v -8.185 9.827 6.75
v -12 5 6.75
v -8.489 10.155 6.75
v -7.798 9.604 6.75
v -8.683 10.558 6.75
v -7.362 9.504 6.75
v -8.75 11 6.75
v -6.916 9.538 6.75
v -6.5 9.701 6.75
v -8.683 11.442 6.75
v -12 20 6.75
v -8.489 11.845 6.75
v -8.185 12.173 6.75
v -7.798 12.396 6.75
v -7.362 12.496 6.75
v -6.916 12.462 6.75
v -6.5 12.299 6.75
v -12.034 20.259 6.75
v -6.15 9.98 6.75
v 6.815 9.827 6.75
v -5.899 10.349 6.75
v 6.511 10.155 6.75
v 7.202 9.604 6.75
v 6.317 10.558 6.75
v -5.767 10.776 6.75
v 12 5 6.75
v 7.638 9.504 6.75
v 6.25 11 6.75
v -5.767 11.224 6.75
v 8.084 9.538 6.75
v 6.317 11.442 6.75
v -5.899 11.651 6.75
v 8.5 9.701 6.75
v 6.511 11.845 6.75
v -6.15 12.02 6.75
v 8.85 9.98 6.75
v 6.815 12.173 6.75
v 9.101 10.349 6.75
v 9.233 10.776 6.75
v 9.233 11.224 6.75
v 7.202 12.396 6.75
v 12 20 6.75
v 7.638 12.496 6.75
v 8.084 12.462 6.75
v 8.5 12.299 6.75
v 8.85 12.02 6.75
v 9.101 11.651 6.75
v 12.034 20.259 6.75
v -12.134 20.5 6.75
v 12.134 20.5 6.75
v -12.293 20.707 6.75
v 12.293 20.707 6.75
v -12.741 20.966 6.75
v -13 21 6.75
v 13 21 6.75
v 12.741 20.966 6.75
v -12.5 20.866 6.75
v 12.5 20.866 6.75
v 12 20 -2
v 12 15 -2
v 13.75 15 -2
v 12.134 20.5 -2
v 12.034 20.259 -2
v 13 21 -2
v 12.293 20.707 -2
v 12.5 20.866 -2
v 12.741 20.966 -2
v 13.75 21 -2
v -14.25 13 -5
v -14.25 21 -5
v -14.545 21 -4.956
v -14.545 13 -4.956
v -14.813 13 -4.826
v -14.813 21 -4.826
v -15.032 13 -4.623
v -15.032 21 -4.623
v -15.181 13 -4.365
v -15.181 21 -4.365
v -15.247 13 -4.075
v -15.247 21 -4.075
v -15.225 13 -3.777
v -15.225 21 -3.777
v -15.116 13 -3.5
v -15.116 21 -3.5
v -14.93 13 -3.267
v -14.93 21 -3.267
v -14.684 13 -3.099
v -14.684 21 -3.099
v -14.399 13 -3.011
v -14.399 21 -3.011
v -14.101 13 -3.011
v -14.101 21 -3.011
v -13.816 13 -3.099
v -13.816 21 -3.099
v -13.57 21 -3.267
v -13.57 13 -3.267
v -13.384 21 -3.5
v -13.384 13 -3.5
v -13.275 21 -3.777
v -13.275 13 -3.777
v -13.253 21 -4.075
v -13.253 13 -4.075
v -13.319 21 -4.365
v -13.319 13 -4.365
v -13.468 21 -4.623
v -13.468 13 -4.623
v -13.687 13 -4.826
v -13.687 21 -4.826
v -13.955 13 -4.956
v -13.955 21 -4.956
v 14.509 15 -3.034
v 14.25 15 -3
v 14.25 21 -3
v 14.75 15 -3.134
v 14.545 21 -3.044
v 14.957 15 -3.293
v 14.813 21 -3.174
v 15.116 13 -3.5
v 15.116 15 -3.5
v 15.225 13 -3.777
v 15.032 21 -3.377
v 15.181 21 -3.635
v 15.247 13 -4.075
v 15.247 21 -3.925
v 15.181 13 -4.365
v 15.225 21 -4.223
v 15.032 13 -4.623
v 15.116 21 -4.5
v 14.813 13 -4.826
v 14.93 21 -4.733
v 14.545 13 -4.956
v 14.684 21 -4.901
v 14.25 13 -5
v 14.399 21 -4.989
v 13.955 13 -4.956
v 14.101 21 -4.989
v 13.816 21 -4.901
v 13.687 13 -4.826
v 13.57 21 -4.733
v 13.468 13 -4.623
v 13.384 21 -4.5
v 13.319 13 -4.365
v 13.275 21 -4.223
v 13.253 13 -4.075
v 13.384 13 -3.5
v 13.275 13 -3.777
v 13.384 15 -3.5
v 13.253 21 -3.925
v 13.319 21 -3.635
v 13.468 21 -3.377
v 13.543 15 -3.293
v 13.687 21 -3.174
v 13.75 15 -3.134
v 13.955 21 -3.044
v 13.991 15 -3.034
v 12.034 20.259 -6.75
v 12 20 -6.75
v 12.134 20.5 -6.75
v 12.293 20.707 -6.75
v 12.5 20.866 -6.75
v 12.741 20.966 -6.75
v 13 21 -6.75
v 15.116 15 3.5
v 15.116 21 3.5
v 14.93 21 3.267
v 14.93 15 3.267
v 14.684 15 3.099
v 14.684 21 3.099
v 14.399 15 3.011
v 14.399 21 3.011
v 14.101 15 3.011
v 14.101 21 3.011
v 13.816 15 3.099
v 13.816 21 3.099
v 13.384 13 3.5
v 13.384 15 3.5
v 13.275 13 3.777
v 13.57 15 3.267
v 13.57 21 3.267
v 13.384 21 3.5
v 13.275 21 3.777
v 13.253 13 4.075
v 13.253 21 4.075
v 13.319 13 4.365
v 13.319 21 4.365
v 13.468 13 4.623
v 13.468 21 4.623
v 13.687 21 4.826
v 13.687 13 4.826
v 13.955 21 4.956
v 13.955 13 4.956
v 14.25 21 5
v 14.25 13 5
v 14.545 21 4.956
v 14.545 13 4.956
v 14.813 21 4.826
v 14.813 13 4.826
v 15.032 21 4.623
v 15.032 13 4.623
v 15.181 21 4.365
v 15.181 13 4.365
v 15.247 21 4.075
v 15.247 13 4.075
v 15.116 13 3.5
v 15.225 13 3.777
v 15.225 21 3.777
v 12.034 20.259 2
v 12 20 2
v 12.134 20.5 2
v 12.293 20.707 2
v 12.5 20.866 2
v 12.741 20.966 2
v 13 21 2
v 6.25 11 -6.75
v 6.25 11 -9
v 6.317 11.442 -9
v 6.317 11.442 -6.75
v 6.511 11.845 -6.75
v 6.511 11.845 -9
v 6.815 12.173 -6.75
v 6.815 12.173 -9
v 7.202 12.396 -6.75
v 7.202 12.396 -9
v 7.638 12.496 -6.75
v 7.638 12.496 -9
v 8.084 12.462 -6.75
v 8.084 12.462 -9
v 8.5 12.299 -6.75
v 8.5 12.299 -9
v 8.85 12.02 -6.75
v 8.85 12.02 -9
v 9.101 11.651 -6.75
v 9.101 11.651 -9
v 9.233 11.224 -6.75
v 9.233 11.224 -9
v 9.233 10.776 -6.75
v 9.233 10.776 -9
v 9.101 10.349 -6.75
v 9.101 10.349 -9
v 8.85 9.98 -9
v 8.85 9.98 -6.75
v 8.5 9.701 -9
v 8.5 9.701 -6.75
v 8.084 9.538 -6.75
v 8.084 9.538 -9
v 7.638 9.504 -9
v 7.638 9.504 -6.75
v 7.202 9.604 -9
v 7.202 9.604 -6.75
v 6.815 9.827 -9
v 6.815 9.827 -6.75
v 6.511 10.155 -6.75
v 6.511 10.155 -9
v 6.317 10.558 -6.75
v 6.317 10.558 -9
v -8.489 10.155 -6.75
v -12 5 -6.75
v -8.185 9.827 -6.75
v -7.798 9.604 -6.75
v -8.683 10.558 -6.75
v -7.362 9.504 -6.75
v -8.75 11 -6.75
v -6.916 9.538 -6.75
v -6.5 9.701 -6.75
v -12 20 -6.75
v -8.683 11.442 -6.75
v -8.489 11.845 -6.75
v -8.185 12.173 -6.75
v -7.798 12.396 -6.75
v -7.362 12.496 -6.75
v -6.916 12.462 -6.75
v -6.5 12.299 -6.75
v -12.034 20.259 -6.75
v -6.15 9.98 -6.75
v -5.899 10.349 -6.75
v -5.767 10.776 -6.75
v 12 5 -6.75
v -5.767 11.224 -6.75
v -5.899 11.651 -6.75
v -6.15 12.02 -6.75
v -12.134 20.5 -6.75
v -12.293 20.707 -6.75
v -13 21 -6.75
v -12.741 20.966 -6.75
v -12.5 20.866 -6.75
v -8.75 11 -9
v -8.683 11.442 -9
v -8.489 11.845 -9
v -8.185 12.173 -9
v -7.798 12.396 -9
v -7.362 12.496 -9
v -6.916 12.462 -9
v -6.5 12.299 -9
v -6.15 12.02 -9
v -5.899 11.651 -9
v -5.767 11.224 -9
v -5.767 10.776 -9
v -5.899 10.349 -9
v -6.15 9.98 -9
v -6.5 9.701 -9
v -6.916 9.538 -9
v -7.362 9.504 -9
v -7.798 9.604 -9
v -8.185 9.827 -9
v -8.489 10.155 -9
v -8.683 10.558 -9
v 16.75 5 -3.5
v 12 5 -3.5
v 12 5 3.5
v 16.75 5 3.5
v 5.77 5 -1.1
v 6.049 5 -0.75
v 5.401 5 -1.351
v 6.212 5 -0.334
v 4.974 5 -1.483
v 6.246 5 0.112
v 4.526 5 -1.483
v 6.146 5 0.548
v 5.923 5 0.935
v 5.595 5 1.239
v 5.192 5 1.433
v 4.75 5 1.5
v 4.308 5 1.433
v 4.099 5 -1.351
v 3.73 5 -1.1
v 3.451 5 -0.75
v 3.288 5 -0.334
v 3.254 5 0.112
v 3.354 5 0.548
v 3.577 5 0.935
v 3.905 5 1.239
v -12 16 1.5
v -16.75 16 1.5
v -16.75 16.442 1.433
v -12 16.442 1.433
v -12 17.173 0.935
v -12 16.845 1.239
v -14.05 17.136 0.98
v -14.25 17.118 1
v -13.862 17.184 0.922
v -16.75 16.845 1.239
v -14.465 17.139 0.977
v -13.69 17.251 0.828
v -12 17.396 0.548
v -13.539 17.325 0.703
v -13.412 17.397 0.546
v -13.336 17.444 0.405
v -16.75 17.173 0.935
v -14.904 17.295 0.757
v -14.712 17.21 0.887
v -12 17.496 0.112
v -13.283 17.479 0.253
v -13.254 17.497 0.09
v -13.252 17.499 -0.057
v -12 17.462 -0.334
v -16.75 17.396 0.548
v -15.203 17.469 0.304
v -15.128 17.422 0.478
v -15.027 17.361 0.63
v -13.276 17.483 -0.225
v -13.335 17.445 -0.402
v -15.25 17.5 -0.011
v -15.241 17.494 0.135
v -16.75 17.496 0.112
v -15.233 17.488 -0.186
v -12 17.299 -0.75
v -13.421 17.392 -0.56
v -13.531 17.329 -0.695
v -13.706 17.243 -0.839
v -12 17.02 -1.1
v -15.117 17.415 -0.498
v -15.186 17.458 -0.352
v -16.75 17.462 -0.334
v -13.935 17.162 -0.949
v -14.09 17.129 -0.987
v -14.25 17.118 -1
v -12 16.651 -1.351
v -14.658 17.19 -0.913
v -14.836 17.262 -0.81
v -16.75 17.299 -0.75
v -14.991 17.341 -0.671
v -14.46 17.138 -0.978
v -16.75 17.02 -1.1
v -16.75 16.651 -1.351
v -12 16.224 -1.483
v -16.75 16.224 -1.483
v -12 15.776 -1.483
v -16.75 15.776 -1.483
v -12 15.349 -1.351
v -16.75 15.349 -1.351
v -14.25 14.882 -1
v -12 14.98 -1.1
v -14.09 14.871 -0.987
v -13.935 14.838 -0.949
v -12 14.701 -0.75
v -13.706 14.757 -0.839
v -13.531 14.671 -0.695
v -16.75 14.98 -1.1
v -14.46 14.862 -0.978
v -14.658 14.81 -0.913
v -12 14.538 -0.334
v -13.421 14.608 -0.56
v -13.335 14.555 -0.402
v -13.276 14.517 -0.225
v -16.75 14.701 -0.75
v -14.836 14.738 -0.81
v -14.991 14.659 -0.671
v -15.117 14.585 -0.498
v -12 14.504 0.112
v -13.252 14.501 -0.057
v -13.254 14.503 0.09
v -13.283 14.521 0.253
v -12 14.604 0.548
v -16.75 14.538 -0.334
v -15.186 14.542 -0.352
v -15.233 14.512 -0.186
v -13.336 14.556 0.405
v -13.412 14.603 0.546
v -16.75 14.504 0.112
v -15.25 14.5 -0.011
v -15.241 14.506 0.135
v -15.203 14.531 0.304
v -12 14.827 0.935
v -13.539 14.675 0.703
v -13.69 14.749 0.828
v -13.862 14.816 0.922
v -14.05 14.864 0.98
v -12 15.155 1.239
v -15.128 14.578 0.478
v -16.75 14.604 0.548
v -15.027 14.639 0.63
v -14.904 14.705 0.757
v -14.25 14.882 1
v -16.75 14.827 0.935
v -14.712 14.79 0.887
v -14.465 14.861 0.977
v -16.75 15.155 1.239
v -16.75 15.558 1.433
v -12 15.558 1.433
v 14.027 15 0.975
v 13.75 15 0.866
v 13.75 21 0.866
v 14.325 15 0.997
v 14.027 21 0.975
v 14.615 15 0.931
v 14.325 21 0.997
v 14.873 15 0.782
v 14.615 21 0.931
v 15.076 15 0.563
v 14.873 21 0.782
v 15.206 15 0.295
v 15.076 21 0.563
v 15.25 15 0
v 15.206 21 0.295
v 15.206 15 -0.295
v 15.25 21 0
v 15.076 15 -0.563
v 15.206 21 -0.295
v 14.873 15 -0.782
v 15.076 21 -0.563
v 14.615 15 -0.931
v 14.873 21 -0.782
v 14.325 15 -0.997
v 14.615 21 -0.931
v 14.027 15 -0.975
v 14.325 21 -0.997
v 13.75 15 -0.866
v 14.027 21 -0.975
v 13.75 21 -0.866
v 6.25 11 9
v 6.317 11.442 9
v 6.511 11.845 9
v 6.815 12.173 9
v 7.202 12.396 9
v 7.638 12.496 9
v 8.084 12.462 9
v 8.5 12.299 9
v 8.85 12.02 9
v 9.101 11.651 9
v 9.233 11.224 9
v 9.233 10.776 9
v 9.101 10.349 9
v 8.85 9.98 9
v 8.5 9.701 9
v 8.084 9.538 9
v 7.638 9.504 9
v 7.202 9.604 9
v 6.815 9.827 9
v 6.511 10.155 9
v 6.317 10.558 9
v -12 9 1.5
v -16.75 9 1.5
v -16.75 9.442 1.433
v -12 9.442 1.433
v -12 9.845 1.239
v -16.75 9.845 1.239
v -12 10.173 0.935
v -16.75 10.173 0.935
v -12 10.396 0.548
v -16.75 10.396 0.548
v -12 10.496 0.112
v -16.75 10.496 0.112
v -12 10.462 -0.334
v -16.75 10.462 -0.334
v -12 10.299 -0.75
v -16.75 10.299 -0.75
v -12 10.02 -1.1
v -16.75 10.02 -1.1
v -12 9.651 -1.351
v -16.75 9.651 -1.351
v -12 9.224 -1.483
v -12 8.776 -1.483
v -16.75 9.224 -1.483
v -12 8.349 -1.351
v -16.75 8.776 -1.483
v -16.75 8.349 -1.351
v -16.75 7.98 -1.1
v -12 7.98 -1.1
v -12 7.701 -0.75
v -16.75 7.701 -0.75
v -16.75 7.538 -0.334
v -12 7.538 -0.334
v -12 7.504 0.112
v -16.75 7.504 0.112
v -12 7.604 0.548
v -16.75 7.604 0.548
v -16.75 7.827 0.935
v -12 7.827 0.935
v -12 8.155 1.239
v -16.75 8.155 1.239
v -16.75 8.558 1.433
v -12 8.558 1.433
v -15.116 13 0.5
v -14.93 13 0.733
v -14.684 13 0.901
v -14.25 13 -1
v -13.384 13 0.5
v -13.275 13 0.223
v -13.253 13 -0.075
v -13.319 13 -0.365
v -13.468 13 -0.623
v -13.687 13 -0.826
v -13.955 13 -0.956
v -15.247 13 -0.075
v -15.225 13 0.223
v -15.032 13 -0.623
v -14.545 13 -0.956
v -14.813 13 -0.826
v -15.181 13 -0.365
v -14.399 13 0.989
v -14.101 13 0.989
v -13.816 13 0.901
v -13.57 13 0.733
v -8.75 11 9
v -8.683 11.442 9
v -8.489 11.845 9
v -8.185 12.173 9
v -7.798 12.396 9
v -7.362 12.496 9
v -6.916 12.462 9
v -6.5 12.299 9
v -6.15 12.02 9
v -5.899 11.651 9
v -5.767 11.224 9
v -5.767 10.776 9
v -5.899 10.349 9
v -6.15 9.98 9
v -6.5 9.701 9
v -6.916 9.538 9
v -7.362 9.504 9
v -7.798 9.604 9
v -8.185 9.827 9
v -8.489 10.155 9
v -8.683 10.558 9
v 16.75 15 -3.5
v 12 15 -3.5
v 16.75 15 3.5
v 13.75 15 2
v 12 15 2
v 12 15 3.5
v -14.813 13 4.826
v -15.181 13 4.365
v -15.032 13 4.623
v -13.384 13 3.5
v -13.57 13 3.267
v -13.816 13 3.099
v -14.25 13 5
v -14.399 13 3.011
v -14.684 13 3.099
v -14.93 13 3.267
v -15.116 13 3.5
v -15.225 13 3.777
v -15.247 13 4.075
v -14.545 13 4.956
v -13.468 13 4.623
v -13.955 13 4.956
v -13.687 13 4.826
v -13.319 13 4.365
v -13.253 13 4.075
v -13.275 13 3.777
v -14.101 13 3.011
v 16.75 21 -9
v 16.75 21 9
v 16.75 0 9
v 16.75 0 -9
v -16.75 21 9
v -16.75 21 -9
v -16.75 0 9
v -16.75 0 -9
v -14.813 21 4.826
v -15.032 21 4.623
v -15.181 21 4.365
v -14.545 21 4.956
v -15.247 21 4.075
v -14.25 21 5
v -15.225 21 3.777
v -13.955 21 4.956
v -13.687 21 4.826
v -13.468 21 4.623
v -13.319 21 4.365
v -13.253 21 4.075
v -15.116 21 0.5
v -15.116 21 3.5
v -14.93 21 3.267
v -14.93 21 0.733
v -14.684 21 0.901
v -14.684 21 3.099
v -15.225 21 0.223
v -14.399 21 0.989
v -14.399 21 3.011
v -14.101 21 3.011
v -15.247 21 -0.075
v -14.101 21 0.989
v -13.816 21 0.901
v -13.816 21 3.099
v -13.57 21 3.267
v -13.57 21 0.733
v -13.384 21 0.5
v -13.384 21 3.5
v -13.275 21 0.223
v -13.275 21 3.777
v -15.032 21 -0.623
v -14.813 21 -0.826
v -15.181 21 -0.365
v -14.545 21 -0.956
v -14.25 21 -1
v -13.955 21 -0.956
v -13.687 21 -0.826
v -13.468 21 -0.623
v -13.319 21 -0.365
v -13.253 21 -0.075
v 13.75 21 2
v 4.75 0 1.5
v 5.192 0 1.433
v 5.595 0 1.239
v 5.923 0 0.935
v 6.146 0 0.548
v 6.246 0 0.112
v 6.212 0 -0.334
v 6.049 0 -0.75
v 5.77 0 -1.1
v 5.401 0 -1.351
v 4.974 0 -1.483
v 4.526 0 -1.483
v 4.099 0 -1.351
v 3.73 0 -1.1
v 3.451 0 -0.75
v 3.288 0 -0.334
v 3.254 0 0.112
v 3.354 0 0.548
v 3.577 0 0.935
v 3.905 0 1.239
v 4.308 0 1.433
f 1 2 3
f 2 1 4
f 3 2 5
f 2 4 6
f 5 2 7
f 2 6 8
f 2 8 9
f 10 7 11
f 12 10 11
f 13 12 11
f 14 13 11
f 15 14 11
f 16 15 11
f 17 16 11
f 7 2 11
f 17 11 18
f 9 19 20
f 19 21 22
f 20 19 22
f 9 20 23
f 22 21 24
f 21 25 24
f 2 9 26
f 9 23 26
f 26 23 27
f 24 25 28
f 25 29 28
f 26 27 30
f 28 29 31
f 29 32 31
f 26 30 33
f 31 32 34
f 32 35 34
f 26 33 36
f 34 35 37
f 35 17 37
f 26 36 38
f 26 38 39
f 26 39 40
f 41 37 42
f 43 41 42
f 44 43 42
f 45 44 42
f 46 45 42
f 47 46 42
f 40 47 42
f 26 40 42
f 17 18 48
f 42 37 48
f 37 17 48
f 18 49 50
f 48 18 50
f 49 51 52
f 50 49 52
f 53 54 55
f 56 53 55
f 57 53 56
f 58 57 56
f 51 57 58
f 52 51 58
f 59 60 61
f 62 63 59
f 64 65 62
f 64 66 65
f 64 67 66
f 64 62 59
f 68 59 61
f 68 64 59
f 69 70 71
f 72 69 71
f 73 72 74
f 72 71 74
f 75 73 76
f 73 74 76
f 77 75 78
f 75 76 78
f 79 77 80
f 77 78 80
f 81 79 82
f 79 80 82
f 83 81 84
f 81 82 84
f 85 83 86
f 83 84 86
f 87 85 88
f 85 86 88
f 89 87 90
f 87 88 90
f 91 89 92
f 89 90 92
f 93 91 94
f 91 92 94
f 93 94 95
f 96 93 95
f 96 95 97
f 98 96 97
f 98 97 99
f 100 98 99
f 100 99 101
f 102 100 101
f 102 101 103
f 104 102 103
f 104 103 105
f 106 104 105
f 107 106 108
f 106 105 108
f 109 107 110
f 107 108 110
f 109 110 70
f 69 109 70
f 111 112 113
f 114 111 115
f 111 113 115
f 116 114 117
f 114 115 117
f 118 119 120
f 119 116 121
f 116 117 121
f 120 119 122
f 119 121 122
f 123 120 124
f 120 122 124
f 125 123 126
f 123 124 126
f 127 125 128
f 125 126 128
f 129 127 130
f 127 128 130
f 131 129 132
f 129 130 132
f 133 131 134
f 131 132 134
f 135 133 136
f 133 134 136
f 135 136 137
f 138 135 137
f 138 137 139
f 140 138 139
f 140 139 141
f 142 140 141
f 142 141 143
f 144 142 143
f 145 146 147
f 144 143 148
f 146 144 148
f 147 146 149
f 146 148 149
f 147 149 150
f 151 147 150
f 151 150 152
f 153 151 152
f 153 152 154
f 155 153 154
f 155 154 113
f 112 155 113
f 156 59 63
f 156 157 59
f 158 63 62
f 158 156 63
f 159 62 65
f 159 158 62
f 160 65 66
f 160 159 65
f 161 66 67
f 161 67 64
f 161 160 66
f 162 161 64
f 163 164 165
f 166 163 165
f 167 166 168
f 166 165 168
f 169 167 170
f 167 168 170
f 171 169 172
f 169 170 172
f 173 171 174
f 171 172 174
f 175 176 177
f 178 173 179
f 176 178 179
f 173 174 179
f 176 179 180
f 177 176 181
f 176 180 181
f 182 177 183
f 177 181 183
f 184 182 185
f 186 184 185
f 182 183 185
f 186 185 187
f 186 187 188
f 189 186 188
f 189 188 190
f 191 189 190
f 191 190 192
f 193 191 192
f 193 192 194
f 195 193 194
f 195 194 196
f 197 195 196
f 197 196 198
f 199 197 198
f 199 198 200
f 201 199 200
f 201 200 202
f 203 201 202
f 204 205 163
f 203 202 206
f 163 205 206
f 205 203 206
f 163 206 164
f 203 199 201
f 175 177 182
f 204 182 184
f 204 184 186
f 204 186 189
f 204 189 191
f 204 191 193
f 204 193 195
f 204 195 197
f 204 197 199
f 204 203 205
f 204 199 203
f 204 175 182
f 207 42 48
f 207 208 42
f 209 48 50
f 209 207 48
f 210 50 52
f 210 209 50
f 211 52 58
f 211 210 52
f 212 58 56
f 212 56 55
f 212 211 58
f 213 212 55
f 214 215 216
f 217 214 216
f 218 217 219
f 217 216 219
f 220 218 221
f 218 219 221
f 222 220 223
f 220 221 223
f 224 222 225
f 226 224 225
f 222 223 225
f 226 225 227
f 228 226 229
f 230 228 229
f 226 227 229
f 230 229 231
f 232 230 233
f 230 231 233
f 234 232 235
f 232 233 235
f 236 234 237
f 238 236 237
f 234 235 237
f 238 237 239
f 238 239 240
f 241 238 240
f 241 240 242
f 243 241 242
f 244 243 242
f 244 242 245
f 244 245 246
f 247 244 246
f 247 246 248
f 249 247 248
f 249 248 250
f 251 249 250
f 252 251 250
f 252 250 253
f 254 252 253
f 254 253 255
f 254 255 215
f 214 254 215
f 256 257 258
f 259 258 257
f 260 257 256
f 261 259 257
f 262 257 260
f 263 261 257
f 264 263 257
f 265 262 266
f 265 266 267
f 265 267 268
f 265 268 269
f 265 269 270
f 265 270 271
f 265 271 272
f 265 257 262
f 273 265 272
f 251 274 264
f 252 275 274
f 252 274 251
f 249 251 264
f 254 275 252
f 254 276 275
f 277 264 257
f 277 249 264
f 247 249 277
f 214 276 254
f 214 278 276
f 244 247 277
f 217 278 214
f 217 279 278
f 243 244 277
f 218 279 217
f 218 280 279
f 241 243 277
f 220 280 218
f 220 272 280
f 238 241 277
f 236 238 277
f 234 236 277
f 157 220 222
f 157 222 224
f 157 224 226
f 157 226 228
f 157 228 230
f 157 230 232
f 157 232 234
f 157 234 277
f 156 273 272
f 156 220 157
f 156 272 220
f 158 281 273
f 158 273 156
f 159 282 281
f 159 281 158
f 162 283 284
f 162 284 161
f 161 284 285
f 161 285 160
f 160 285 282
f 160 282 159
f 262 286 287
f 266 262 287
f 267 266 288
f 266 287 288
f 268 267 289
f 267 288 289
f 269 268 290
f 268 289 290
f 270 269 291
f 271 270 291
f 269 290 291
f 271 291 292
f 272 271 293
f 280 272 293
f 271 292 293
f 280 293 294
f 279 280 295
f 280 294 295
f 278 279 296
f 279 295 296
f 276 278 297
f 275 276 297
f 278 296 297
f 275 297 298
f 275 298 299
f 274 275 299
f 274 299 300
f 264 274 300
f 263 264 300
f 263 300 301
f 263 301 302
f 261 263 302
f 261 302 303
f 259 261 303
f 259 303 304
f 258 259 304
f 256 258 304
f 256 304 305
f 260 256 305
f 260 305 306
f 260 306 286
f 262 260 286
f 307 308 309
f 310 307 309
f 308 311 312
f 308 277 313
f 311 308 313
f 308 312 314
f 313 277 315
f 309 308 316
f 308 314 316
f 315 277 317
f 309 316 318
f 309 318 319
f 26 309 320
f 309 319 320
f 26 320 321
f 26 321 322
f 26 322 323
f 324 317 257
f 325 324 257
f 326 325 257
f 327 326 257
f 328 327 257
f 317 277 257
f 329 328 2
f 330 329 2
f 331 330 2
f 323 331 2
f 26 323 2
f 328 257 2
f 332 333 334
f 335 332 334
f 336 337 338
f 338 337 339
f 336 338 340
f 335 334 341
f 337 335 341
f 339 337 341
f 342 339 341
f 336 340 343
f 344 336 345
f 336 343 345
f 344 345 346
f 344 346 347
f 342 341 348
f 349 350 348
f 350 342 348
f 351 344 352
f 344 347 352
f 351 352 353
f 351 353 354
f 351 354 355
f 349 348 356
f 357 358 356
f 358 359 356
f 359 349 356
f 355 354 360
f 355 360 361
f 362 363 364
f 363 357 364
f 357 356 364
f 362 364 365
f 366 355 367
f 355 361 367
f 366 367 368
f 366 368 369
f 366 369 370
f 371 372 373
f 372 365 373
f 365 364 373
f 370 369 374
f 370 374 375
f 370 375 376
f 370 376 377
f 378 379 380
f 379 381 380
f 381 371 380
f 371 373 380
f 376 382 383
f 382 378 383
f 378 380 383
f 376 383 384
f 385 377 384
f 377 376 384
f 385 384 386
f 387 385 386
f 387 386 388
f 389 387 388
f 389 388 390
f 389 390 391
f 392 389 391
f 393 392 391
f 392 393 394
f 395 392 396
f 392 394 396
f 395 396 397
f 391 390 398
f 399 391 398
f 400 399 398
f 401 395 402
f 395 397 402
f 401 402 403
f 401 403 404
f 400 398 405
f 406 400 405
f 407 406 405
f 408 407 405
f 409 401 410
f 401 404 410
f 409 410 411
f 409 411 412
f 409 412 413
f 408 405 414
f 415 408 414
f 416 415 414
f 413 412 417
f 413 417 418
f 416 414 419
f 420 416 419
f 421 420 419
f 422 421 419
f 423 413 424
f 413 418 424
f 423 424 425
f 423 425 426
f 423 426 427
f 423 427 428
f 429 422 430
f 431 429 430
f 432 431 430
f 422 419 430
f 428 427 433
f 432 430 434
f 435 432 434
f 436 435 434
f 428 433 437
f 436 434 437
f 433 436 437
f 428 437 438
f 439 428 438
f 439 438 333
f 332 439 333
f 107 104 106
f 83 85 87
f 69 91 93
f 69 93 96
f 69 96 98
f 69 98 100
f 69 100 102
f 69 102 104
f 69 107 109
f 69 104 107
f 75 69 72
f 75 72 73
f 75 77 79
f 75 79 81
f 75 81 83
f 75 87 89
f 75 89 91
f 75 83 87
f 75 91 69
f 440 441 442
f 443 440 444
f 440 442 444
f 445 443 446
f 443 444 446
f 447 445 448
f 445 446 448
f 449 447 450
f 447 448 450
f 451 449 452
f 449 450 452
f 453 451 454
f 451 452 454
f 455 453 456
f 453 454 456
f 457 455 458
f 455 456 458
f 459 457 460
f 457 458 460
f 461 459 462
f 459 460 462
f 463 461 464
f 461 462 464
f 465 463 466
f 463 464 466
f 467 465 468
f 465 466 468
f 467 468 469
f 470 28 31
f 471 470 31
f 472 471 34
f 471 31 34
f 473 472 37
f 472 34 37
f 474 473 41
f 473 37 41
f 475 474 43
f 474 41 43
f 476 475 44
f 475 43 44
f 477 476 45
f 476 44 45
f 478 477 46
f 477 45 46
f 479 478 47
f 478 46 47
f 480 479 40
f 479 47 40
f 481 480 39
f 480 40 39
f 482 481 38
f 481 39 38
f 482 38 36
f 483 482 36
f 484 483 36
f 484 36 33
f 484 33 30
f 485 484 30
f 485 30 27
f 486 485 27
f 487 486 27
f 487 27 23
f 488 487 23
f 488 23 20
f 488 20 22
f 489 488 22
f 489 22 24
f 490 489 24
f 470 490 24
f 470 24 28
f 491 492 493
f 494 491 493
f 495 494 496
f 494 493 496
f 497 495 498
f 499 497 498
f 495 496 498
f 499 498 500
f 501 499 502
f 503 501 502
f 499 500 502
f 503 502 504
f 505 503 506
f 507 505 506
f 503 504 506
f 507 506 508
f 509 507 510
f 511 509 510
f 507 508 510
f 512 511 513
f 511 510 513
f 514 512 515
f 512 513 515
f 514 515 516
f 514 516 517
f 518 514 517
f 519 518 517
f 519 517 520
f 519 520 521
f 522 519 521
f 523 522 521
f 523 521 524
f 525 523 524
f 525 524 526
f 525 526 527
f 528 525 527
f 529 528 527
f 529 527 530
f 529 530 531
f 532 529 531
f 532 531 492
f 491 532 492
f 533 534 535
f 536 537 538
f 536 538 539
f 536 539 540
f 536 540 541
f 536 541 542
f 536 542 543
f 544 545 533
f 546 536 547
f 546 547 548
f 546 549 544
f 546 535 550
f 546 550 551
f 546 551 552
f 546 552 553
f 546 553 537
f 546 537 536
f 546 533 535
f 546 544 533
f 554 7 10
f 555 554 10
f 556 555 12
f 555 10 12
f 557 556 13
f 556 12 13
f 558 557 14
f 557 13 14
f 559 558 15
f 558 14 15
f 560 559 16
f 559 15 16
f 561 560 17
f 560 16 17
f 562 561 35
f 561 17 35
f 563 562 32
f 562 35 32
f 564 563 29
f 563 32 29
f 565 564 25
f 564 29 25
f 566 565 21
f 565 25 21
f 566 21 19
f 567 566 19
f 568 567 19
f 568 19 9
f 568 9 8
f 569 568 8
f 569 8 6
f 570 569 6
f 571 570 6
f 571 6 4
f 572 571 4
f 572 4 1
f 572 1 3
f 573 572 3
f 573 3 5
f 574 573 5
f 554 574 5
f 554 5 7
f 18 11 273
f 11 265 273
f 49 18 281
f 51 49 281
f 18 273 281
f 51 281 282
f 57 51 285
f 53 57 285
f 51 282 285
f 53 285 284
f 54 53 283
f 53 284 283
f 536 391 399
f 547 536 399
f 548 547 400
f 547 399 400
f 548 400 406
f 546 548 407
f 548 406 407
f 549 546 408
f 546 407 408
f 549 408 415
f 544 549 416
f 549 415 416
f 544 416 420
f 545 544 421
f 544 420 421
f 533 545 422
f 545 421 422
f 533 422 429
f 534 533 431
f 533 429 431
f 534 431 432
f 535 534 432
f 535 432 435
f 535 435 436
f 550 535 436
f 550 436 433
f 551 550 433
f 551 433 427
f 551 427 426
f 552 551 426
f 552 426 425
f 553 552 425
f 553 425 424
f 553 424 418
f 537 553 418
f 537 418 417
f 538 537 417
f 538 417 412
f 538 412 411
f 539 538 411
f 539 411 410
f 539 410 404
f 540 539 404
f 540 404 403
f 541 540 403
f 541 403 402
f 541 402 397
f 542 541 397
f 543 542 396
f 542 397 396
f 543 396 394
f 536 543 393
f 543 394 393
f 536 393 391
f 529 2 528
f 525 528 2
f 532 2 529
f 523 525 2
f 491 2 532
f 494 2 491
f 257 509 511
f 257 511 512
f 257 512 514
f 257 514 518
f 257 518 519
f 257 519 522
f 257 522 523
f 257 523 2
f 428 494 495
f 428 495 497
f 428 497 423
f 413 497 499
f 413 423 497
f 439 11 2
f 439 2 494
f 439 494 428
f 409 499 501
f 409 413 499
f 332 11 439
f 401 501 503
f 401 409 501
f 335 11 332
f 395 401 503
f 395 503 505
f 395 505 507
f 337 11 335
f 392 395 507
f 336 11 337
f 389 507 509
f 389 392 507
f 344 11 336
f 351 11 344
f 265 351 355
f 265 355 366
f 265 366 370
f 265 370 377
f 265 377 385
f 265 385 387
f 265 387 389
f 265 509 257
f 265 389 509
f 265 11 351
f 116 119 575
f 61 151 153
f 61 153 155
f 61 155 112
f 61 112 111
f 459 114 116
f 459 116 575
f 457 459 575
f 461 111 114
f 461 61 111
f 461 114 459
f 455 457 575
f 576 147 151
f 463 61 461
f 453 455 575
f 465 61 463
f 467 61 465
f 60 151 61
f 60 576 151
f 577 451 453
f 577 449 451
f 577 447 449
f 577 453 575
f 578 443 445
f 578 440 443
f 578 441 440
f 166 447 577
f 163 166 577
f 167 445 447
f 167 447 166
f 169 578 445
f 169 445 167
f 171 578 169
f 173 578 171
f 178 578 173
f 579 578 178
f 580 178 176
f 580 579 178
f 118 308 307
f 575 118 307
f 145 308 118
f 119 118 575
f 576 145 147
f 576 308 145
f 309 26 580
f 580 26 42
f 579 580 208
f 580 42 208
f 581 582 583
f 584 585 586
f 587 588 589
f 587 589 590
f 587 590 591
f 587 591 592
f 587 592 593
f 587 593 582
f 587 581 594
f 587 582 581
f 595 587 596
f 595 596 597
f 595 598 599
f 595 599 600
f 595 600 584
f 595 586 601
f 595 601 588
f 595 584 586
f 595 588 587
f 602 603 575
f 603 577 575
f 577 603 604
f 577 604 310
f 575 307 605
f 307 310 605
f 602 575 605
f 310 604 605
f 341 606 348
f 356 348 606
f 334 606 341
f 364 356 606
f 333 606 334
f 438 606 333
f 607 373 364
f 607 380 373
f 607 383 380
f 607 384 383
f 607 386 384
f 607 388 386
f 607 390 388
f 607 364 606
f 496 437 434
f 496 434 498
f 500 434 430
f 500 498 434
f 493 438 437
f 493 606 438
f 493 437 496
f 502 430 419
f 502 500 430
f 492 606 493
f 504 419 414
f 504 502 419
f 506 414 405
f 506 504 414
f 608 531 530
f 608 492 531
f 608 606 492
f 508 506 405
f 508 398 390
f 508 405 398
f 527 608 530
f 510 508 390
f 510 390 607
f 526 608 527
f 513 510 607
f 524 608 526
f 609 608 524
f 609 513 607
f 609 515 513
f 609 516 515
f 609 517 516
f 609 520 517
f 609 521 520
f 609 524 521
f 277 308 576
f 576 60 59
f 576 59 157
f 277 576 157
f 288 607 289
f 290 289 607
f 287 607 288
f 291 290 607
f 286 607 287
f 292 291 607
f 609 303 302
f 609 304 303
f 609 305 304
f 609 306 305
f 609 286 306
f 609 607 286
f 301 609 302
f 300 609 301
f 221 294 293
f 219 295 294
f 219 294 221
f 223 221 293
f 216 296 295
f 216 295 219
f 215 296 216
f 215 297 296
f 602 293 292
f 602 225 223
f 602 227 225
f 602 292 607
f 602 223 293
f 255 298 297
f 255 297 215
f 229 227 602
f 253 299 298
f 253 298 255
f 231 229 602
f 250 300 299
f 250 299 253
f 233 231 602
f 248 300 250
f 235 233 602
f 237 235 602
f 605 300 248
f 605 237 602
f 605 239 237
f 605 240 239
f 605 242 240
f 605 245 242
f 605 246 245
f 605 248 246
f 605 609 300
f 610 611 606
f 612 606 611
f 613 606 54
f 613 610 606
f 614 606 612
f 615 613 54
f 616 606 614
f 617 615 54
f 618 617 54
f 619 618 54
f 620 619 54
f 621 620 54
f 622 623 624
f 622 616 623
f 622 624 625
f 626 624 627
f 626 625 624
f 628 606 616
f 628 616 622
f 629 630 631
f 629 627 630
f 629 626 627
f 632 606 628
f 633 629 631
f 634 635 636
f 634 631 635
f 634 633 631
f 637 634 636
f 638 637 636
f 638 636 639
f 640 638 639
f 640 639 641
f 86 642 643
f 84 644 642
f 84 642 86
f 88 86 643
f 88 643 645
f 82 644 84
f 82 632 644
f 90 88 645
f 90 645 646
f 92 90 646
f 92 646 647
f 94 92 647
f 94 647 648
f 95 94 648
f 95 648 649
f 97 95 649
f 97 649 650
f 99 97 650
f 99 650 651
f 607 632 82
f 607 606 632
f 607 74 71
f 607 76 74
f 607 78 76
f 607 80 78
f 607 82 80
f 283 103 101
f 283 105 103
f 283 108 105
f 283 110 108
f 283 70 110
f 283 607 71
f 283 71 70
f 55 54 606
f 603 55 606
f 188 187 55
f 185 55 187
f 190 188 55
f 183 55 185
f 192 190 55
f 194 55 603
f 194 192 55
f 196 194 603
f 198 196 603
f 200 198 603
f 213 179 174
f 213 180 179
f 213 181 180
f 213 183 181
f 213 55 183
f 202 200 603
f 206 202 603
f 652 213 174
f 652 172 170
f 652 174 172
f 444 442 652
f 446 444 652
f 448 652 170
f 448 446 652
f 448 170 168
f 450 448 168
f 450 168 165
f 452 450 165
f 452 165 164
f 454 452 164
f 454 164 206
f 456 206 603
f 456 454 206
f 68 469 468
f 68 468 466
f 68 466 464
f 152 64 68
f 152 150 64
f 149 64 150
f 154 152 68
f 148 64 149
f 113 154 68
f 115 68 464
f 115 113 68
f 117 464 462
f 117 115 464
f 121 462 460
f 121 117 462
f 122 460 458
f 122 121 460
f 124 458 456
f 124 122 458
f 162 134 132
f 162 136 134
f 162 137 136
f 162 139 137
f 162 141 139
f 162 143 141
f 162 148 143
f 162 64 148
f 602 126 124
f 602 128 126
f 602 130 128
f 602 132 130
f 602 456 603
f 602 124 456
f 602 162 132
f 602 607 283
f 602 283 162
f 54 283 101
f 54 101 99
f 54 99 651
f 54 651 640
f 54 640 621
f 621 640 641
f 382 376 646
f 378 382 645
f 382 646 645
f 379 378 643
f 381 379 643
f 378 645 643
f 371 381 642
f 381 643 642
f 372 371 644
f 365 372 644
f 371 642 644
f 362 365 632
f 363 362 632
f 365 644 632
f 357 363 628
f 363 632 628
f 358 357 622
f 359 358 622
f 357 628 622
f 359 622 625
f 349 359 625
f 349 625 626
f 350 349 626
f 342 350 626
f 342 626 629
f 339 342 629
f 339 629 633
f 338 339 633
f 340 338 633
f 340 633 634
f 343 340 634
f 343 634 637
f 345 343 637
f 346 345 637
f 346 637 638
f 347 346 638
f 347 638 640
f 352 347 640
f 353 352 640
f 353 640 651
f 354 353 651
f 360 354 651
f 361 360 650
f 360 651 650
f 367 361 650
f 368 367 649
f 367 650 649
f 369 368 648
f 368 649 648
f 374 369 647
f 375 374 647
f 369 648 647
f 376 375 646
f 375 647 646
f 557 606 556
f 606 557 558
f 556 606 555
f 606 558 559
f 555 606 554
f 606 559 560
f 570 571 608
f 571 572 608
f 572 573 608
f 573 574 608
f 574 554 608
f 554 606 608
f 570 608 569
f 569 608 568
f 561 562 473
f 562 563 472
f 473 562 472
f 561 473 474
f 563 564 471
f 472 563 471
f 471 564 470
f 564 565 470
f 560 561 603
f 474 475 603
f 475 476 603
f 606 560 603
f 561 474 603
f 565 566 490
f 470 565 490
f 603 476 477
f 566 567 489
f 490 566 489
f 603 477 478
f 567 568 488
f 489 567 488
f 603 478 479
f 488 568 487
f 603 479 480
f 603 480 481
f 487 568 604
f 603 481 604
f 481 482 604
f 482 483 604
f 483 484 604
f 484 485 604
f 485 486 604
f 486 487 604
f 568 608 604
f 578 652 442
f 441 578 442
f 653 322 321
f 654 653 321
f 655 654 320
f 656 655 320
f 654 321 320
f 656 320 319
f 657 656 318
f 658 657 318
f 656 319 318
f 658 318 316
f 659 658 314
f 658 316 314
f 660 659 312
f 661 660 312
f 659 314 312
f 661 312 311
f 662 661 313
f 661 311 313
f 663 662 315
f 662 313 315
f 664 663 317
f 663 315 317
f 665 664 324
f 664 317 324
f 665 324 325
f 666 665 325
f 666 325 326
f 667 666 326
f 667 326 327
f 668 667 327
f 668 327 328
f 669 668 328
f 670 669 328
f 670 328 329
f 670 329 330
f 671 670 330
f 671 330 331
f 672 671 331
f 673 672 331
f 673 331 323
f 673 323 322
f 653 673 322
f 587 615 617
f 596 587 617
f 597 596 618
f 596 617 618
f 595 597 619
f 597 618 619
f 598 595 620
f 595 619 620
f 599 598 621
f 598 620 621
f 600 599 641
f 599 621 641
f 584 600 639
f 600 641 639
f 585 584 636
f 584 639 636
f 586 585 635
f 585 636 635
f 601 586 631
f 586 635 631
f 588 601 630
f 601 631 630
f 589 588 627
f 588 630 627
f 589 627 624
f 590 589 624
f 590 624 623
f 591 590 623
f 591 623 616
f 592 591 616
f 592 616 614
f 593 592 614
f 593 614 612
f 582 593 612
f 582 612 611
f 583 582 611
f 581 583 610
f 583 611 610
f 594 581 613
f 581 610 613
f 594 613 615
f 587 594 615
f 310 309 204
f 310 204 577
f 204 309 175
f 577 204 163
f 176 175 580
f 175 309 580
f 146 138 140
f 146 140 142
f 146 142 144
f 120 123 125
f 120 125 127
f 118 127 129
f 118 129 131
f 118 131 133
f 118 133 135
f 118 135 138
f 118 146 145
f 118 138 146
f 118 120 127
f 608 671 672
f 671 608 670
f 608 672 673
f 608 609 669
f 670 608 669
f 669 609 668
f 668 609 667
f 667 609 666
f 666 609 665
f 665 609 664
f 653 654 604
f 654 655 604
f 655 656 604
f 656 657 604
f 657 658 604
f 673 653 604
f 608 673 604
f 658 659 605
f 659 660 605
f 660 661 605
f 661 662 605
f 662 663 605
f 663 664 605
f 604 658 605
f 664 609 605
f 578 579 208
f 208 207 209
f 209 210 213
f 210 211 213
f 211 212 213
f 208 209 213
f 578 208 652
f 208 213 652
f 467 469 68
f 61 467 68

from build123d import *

# Parameters (mm, degrees)
CROQUIS1_W              = 33.5
CROQUIS1_H              = 18
SALIENTE_EXTRUIR1_DEPTH = 21
CROQUIS2_W              = 23.5
CROQUIS2_H              = 13.5
CORTAR_EXTRUIR1_DEPTH   = 16
CORTAR_EXTRUIR2_REACH   = 38.527
CROQUIS3_W              = 7
CROQUIS3_H              = 10
CROQUIS4_R              = 1
CORTAR_EXTRUIR3_DEPTH   = 8
CORTAR_EXTRUIR4_REACH   = 30.33
CROQUIS5_W              = 2
CROQUIS5_H              = 4
CORTAR_EXTRUIR5_REACH   = 26.851
CROQUIS6_R              = 1.5
CORTAR_EXTRUIR6_REACH   = 42.549
CROQUIS7_R              = 1.5
CROQUIS8_R              = 1.5
CORTAR_EXTRUIR7_DEPTH   = 33.335159
CORTAR_EXTRUIR8_REACH   = 30.33
CROQUIS9_W              = 0.25
CROQUIS9_H              = 13.5
REDONDEO1_R             = 1


with BuildPart() as part:
    # Croquis1 → Saliente-Extruir1 (new body)
    with BuildSketch(Plane(origin=(0, 0, 0), x_dir=(1, 0, 0), z_dir=(0, 1, 0))):
        Rectangle(CROQUIS1_W, CROQUIS1_H)
    extrude(amount=SALIENTE_EXTRUIR1_DEPTH)

    # Croquis2 → Cortar-Extruir1 (cut)
    with BuildSketch(Plane(origin=(0, 21, 0), x_dir=(1, 0, 0), z_dir=(0, 1, 0))):
        Rectangle(CROQUIS2_W, CROQUIS2_H)
    extrude(amount=-CORTAR_EXTRUIR1_DEPTH, mode=Mode.SUBTRACT)

    # Croquis3 → Cortar-Extruir2 (cut, up to next)
    with BuildSketch(Plane.ZY.offset(-11.75), mode=Mode.PRIVATE) as cortar_extruir2_sk1:
        with Locations((0, 10)):
            Rectangle(CROQUIS3_W, CROQUIS3_H)
    cortar_extruir2_tool1 = extrude(cortar_extruir2_sk1.sketch, amount=-CORTAR_EXTRUIR2_REACH, mode=Mode.PRIVATE) & part.part
    add(cortar_extruir2_tool1.solids().sort_by_distance((11.75, 10, 0))[0], mode=Mode.SUBTRACT)

    # Croquis4 → Cortar-Extruir3 (cut)
    with BuildSketch(Plane(origin=(0, 21, 0), x_dir=(1, 0, 0), z_dir=(0, 1, 0))):
        with Locations(Location((14.25, 0, 0), (0, 0, 270))):
            Circle(CROQUIS4_R)
        with Locations(Location((14.25, 4, 0), (0, 0, 270))):
            Circle(CROQUIS4_R)
        with Locations(Location((14.25, -4, 0), (0, 0, 30))):
            Circle(CROQUIS4_R)
        with Locations(Location((-14.25, -4, 0), (0, 0, 270))):
            Circle(CROQUIS4_R)
        with Locations(Location((-14.25, 0, 0), (0, 0, 90))):
            Circle(CROQUIS4_R)
        with Locations(Location((-14.25, 4, 0), (0, 0, 90))):
            Circle(CROQUIS4_R)
    extrude(amount=-CORTAR_EXTRUIR3_DEPTH, mode=Mode.SUBTRACT)

    # Croquis5 → Cortar-Extruir4 (cut, up to next)
    with BuildSketch(Plane(origin=(0, 21, 0), x_dir=(1, 0, 0), z_dir=(0, 1, 0)), mode=Mode.PRIVATE) as cortar_extruir4_sk1:
        with Locations((12.75, 0)):
            Rectangle(CROQUIS5_W, CROQUIS5_H)
    cortar_extruir4_tool1 = extrude(cortar_extruir4_sk1.sketch, amount=-CORTAR_EXTRUIR4_REACH, mode=Mode.PRIVATE) & part.part
    add(cortar_extruir4_tool1.solids().sort_by_distance((12.75, 21, 0))[0], mode=Mode.SUBTRACT)

    # Croquis6 → Cortar-Extruir5 (cut, up to next)
    with BuildSketch(Plane(origin=(0, 5, 0), x_dir=(1, 0, 0), z_dir=(0, 1, 0)), mode=Mode.PRIVATE) as cortar_extruir5_sk1:
        with Locations(Location((4.75, 0, 0), (0, 0, 270))):
            Circle(CROQUIS6_R)
    cortar_extruir5_tool1 = extrude(cortar_extruir5_sk1.sketch, amount=-CORTAR_EXTRUIR5_REACH, mode=Mode.PRIVATE) & part.part
    add(cortar_extruir5_tool1.solids().sort_by_distance((4.75, 5, 0))[0], mode=Mode.SUBTRACT)

    # Croquis7 → Cortar-Extruir6 (cut, up to next)
    with BuildSketch(Plane.ZY.offset(16.75), mode=Mode.PRIVATE) as cortar_extruir6_sk1:
        with Locations((0, 16)):
            Circle(CROQUIS7_R)
    cortar_extruir6_tool1 = extrude(cortar_extruir6_sk1.sketch, amount=-CORTAR_EXTRUIR6_REACH, mode=Mode.PRIVATE) & part.part
    # Croquis7 → Cortar-Extruir6 (cut, up to next)
    with BuildSketch(Plane.ZY.offset(16.75), mode=Mode.PRIVATE) as cortar_extruir6_sk2:
        with Locations((0, 9)):
            Circle(CROQUIS7_R)
    cortar_extruir6_tool2 = extrude(cortar_extruir6_sk2.sketch, amount=-CORTAR_EXTRUIR6_REACH, mode=Mode.PRIVATE) & part.part
    add(cortar_extruir6_tool1.solids().sort_by_distance((-16.75, 16, 0))[0], mode=Mode.SUBTRACT)
    add(cortar_extruir6_tool2.solids().sort_by_distance((-16.75, 9, 0))[0], mode=Mode.SUBTRACT)

    # Croquis8 → Cortar-Extruir7 (cut, through all)
    with BuildSketch(Plane(origin=(0, 0, -9), x_dir=(-1, 0, 0), z_dir=(0, 0, -1))):
        with Locations((-7.75, 11)):
            Circle(CROQUIS8_R)
        with Locations((7.25, 11)):
            Circle(CROQUIS8_R)
    extrude(amount=-CORTAR_EXTRUIR7_DEPTH, mode=Mode.SUBTRACT)

    # Cortar-Extruir8: up to this face of the body (flat: up to its plane)
    cortar_extruir8_end = Plane(part.part.faces().sort_by_distance((1.347622457, 5, 0))[0])
    # Croquis9 → Cortar-Extruir8 (cut, up to the picked face)
    with BuildSketch(Plane(origin=(0, 21, 0), x_dir=(1, 0, 0), z_dir=(0, 1, 0)), mode=Mode.PRIVATE) as cortar_extruir8_sk1:
        with Locations((-11.875, 0)):
            Rectangle(CROQUIS9_W, CROQUIS9_H)
    cortar_extruir8_tool1 = split(extrude(cortar_extruir8_sk1.sketch, amount=-CORTAR_EXTRUIR8_REACH, mode=Mode.PRIVATE), bisect_by=cortar_extruir8_end, keep=Keep.BOTH, mode=Mode.PRIVATE)
    # Croquis9 → Cortar-Extruir8 (cut, up to the picked face)
    with BuildSketch(Plane(origin=(0, 21, 0), x_dir=(1, 0, 0), z_dir=(0, 1, 0)), mode=Mode.PRIVATE) as cortar_extruir8_sk2:
        with Locations((11.875, 0)):
            Rectangle(CROQUIS9_W, CROQUIS9_H)
    cortar_extruir8_tool2 = split(extrude(cortar_extruir8_sk2.sketch, amount=-CORTAR_EXTRUIR8_REACH, mode=Mode.PRIVATE), bisect_by=cortar_extruir8_end, keep=Keep.BOTH, mode=Mode.PRIVATE)
    add(cortar_extruir8_tool1.solids().sort_by(Axis((-11.875, 21, 0), (0, -1, 0)))[0], mode=Mode.SUBTRACT)
    add(cortar_extruir8_tool2.solids().sort_by(Axis((11.875, 21, 0), (0, -1, 0)))[0], mode=Mode.SUBTRACT)

    # Redondeo1
    redondeo1_edges = [part.edges().sort_by_distance(p)[0] for p in [
        (-12, 21, 0),
        (12, 21, -4.375),
        (12, 21, 4.375),
    ]]
    fillet(redondeo1_edges, radius=REDONDEO1_R)


solid = part.part
